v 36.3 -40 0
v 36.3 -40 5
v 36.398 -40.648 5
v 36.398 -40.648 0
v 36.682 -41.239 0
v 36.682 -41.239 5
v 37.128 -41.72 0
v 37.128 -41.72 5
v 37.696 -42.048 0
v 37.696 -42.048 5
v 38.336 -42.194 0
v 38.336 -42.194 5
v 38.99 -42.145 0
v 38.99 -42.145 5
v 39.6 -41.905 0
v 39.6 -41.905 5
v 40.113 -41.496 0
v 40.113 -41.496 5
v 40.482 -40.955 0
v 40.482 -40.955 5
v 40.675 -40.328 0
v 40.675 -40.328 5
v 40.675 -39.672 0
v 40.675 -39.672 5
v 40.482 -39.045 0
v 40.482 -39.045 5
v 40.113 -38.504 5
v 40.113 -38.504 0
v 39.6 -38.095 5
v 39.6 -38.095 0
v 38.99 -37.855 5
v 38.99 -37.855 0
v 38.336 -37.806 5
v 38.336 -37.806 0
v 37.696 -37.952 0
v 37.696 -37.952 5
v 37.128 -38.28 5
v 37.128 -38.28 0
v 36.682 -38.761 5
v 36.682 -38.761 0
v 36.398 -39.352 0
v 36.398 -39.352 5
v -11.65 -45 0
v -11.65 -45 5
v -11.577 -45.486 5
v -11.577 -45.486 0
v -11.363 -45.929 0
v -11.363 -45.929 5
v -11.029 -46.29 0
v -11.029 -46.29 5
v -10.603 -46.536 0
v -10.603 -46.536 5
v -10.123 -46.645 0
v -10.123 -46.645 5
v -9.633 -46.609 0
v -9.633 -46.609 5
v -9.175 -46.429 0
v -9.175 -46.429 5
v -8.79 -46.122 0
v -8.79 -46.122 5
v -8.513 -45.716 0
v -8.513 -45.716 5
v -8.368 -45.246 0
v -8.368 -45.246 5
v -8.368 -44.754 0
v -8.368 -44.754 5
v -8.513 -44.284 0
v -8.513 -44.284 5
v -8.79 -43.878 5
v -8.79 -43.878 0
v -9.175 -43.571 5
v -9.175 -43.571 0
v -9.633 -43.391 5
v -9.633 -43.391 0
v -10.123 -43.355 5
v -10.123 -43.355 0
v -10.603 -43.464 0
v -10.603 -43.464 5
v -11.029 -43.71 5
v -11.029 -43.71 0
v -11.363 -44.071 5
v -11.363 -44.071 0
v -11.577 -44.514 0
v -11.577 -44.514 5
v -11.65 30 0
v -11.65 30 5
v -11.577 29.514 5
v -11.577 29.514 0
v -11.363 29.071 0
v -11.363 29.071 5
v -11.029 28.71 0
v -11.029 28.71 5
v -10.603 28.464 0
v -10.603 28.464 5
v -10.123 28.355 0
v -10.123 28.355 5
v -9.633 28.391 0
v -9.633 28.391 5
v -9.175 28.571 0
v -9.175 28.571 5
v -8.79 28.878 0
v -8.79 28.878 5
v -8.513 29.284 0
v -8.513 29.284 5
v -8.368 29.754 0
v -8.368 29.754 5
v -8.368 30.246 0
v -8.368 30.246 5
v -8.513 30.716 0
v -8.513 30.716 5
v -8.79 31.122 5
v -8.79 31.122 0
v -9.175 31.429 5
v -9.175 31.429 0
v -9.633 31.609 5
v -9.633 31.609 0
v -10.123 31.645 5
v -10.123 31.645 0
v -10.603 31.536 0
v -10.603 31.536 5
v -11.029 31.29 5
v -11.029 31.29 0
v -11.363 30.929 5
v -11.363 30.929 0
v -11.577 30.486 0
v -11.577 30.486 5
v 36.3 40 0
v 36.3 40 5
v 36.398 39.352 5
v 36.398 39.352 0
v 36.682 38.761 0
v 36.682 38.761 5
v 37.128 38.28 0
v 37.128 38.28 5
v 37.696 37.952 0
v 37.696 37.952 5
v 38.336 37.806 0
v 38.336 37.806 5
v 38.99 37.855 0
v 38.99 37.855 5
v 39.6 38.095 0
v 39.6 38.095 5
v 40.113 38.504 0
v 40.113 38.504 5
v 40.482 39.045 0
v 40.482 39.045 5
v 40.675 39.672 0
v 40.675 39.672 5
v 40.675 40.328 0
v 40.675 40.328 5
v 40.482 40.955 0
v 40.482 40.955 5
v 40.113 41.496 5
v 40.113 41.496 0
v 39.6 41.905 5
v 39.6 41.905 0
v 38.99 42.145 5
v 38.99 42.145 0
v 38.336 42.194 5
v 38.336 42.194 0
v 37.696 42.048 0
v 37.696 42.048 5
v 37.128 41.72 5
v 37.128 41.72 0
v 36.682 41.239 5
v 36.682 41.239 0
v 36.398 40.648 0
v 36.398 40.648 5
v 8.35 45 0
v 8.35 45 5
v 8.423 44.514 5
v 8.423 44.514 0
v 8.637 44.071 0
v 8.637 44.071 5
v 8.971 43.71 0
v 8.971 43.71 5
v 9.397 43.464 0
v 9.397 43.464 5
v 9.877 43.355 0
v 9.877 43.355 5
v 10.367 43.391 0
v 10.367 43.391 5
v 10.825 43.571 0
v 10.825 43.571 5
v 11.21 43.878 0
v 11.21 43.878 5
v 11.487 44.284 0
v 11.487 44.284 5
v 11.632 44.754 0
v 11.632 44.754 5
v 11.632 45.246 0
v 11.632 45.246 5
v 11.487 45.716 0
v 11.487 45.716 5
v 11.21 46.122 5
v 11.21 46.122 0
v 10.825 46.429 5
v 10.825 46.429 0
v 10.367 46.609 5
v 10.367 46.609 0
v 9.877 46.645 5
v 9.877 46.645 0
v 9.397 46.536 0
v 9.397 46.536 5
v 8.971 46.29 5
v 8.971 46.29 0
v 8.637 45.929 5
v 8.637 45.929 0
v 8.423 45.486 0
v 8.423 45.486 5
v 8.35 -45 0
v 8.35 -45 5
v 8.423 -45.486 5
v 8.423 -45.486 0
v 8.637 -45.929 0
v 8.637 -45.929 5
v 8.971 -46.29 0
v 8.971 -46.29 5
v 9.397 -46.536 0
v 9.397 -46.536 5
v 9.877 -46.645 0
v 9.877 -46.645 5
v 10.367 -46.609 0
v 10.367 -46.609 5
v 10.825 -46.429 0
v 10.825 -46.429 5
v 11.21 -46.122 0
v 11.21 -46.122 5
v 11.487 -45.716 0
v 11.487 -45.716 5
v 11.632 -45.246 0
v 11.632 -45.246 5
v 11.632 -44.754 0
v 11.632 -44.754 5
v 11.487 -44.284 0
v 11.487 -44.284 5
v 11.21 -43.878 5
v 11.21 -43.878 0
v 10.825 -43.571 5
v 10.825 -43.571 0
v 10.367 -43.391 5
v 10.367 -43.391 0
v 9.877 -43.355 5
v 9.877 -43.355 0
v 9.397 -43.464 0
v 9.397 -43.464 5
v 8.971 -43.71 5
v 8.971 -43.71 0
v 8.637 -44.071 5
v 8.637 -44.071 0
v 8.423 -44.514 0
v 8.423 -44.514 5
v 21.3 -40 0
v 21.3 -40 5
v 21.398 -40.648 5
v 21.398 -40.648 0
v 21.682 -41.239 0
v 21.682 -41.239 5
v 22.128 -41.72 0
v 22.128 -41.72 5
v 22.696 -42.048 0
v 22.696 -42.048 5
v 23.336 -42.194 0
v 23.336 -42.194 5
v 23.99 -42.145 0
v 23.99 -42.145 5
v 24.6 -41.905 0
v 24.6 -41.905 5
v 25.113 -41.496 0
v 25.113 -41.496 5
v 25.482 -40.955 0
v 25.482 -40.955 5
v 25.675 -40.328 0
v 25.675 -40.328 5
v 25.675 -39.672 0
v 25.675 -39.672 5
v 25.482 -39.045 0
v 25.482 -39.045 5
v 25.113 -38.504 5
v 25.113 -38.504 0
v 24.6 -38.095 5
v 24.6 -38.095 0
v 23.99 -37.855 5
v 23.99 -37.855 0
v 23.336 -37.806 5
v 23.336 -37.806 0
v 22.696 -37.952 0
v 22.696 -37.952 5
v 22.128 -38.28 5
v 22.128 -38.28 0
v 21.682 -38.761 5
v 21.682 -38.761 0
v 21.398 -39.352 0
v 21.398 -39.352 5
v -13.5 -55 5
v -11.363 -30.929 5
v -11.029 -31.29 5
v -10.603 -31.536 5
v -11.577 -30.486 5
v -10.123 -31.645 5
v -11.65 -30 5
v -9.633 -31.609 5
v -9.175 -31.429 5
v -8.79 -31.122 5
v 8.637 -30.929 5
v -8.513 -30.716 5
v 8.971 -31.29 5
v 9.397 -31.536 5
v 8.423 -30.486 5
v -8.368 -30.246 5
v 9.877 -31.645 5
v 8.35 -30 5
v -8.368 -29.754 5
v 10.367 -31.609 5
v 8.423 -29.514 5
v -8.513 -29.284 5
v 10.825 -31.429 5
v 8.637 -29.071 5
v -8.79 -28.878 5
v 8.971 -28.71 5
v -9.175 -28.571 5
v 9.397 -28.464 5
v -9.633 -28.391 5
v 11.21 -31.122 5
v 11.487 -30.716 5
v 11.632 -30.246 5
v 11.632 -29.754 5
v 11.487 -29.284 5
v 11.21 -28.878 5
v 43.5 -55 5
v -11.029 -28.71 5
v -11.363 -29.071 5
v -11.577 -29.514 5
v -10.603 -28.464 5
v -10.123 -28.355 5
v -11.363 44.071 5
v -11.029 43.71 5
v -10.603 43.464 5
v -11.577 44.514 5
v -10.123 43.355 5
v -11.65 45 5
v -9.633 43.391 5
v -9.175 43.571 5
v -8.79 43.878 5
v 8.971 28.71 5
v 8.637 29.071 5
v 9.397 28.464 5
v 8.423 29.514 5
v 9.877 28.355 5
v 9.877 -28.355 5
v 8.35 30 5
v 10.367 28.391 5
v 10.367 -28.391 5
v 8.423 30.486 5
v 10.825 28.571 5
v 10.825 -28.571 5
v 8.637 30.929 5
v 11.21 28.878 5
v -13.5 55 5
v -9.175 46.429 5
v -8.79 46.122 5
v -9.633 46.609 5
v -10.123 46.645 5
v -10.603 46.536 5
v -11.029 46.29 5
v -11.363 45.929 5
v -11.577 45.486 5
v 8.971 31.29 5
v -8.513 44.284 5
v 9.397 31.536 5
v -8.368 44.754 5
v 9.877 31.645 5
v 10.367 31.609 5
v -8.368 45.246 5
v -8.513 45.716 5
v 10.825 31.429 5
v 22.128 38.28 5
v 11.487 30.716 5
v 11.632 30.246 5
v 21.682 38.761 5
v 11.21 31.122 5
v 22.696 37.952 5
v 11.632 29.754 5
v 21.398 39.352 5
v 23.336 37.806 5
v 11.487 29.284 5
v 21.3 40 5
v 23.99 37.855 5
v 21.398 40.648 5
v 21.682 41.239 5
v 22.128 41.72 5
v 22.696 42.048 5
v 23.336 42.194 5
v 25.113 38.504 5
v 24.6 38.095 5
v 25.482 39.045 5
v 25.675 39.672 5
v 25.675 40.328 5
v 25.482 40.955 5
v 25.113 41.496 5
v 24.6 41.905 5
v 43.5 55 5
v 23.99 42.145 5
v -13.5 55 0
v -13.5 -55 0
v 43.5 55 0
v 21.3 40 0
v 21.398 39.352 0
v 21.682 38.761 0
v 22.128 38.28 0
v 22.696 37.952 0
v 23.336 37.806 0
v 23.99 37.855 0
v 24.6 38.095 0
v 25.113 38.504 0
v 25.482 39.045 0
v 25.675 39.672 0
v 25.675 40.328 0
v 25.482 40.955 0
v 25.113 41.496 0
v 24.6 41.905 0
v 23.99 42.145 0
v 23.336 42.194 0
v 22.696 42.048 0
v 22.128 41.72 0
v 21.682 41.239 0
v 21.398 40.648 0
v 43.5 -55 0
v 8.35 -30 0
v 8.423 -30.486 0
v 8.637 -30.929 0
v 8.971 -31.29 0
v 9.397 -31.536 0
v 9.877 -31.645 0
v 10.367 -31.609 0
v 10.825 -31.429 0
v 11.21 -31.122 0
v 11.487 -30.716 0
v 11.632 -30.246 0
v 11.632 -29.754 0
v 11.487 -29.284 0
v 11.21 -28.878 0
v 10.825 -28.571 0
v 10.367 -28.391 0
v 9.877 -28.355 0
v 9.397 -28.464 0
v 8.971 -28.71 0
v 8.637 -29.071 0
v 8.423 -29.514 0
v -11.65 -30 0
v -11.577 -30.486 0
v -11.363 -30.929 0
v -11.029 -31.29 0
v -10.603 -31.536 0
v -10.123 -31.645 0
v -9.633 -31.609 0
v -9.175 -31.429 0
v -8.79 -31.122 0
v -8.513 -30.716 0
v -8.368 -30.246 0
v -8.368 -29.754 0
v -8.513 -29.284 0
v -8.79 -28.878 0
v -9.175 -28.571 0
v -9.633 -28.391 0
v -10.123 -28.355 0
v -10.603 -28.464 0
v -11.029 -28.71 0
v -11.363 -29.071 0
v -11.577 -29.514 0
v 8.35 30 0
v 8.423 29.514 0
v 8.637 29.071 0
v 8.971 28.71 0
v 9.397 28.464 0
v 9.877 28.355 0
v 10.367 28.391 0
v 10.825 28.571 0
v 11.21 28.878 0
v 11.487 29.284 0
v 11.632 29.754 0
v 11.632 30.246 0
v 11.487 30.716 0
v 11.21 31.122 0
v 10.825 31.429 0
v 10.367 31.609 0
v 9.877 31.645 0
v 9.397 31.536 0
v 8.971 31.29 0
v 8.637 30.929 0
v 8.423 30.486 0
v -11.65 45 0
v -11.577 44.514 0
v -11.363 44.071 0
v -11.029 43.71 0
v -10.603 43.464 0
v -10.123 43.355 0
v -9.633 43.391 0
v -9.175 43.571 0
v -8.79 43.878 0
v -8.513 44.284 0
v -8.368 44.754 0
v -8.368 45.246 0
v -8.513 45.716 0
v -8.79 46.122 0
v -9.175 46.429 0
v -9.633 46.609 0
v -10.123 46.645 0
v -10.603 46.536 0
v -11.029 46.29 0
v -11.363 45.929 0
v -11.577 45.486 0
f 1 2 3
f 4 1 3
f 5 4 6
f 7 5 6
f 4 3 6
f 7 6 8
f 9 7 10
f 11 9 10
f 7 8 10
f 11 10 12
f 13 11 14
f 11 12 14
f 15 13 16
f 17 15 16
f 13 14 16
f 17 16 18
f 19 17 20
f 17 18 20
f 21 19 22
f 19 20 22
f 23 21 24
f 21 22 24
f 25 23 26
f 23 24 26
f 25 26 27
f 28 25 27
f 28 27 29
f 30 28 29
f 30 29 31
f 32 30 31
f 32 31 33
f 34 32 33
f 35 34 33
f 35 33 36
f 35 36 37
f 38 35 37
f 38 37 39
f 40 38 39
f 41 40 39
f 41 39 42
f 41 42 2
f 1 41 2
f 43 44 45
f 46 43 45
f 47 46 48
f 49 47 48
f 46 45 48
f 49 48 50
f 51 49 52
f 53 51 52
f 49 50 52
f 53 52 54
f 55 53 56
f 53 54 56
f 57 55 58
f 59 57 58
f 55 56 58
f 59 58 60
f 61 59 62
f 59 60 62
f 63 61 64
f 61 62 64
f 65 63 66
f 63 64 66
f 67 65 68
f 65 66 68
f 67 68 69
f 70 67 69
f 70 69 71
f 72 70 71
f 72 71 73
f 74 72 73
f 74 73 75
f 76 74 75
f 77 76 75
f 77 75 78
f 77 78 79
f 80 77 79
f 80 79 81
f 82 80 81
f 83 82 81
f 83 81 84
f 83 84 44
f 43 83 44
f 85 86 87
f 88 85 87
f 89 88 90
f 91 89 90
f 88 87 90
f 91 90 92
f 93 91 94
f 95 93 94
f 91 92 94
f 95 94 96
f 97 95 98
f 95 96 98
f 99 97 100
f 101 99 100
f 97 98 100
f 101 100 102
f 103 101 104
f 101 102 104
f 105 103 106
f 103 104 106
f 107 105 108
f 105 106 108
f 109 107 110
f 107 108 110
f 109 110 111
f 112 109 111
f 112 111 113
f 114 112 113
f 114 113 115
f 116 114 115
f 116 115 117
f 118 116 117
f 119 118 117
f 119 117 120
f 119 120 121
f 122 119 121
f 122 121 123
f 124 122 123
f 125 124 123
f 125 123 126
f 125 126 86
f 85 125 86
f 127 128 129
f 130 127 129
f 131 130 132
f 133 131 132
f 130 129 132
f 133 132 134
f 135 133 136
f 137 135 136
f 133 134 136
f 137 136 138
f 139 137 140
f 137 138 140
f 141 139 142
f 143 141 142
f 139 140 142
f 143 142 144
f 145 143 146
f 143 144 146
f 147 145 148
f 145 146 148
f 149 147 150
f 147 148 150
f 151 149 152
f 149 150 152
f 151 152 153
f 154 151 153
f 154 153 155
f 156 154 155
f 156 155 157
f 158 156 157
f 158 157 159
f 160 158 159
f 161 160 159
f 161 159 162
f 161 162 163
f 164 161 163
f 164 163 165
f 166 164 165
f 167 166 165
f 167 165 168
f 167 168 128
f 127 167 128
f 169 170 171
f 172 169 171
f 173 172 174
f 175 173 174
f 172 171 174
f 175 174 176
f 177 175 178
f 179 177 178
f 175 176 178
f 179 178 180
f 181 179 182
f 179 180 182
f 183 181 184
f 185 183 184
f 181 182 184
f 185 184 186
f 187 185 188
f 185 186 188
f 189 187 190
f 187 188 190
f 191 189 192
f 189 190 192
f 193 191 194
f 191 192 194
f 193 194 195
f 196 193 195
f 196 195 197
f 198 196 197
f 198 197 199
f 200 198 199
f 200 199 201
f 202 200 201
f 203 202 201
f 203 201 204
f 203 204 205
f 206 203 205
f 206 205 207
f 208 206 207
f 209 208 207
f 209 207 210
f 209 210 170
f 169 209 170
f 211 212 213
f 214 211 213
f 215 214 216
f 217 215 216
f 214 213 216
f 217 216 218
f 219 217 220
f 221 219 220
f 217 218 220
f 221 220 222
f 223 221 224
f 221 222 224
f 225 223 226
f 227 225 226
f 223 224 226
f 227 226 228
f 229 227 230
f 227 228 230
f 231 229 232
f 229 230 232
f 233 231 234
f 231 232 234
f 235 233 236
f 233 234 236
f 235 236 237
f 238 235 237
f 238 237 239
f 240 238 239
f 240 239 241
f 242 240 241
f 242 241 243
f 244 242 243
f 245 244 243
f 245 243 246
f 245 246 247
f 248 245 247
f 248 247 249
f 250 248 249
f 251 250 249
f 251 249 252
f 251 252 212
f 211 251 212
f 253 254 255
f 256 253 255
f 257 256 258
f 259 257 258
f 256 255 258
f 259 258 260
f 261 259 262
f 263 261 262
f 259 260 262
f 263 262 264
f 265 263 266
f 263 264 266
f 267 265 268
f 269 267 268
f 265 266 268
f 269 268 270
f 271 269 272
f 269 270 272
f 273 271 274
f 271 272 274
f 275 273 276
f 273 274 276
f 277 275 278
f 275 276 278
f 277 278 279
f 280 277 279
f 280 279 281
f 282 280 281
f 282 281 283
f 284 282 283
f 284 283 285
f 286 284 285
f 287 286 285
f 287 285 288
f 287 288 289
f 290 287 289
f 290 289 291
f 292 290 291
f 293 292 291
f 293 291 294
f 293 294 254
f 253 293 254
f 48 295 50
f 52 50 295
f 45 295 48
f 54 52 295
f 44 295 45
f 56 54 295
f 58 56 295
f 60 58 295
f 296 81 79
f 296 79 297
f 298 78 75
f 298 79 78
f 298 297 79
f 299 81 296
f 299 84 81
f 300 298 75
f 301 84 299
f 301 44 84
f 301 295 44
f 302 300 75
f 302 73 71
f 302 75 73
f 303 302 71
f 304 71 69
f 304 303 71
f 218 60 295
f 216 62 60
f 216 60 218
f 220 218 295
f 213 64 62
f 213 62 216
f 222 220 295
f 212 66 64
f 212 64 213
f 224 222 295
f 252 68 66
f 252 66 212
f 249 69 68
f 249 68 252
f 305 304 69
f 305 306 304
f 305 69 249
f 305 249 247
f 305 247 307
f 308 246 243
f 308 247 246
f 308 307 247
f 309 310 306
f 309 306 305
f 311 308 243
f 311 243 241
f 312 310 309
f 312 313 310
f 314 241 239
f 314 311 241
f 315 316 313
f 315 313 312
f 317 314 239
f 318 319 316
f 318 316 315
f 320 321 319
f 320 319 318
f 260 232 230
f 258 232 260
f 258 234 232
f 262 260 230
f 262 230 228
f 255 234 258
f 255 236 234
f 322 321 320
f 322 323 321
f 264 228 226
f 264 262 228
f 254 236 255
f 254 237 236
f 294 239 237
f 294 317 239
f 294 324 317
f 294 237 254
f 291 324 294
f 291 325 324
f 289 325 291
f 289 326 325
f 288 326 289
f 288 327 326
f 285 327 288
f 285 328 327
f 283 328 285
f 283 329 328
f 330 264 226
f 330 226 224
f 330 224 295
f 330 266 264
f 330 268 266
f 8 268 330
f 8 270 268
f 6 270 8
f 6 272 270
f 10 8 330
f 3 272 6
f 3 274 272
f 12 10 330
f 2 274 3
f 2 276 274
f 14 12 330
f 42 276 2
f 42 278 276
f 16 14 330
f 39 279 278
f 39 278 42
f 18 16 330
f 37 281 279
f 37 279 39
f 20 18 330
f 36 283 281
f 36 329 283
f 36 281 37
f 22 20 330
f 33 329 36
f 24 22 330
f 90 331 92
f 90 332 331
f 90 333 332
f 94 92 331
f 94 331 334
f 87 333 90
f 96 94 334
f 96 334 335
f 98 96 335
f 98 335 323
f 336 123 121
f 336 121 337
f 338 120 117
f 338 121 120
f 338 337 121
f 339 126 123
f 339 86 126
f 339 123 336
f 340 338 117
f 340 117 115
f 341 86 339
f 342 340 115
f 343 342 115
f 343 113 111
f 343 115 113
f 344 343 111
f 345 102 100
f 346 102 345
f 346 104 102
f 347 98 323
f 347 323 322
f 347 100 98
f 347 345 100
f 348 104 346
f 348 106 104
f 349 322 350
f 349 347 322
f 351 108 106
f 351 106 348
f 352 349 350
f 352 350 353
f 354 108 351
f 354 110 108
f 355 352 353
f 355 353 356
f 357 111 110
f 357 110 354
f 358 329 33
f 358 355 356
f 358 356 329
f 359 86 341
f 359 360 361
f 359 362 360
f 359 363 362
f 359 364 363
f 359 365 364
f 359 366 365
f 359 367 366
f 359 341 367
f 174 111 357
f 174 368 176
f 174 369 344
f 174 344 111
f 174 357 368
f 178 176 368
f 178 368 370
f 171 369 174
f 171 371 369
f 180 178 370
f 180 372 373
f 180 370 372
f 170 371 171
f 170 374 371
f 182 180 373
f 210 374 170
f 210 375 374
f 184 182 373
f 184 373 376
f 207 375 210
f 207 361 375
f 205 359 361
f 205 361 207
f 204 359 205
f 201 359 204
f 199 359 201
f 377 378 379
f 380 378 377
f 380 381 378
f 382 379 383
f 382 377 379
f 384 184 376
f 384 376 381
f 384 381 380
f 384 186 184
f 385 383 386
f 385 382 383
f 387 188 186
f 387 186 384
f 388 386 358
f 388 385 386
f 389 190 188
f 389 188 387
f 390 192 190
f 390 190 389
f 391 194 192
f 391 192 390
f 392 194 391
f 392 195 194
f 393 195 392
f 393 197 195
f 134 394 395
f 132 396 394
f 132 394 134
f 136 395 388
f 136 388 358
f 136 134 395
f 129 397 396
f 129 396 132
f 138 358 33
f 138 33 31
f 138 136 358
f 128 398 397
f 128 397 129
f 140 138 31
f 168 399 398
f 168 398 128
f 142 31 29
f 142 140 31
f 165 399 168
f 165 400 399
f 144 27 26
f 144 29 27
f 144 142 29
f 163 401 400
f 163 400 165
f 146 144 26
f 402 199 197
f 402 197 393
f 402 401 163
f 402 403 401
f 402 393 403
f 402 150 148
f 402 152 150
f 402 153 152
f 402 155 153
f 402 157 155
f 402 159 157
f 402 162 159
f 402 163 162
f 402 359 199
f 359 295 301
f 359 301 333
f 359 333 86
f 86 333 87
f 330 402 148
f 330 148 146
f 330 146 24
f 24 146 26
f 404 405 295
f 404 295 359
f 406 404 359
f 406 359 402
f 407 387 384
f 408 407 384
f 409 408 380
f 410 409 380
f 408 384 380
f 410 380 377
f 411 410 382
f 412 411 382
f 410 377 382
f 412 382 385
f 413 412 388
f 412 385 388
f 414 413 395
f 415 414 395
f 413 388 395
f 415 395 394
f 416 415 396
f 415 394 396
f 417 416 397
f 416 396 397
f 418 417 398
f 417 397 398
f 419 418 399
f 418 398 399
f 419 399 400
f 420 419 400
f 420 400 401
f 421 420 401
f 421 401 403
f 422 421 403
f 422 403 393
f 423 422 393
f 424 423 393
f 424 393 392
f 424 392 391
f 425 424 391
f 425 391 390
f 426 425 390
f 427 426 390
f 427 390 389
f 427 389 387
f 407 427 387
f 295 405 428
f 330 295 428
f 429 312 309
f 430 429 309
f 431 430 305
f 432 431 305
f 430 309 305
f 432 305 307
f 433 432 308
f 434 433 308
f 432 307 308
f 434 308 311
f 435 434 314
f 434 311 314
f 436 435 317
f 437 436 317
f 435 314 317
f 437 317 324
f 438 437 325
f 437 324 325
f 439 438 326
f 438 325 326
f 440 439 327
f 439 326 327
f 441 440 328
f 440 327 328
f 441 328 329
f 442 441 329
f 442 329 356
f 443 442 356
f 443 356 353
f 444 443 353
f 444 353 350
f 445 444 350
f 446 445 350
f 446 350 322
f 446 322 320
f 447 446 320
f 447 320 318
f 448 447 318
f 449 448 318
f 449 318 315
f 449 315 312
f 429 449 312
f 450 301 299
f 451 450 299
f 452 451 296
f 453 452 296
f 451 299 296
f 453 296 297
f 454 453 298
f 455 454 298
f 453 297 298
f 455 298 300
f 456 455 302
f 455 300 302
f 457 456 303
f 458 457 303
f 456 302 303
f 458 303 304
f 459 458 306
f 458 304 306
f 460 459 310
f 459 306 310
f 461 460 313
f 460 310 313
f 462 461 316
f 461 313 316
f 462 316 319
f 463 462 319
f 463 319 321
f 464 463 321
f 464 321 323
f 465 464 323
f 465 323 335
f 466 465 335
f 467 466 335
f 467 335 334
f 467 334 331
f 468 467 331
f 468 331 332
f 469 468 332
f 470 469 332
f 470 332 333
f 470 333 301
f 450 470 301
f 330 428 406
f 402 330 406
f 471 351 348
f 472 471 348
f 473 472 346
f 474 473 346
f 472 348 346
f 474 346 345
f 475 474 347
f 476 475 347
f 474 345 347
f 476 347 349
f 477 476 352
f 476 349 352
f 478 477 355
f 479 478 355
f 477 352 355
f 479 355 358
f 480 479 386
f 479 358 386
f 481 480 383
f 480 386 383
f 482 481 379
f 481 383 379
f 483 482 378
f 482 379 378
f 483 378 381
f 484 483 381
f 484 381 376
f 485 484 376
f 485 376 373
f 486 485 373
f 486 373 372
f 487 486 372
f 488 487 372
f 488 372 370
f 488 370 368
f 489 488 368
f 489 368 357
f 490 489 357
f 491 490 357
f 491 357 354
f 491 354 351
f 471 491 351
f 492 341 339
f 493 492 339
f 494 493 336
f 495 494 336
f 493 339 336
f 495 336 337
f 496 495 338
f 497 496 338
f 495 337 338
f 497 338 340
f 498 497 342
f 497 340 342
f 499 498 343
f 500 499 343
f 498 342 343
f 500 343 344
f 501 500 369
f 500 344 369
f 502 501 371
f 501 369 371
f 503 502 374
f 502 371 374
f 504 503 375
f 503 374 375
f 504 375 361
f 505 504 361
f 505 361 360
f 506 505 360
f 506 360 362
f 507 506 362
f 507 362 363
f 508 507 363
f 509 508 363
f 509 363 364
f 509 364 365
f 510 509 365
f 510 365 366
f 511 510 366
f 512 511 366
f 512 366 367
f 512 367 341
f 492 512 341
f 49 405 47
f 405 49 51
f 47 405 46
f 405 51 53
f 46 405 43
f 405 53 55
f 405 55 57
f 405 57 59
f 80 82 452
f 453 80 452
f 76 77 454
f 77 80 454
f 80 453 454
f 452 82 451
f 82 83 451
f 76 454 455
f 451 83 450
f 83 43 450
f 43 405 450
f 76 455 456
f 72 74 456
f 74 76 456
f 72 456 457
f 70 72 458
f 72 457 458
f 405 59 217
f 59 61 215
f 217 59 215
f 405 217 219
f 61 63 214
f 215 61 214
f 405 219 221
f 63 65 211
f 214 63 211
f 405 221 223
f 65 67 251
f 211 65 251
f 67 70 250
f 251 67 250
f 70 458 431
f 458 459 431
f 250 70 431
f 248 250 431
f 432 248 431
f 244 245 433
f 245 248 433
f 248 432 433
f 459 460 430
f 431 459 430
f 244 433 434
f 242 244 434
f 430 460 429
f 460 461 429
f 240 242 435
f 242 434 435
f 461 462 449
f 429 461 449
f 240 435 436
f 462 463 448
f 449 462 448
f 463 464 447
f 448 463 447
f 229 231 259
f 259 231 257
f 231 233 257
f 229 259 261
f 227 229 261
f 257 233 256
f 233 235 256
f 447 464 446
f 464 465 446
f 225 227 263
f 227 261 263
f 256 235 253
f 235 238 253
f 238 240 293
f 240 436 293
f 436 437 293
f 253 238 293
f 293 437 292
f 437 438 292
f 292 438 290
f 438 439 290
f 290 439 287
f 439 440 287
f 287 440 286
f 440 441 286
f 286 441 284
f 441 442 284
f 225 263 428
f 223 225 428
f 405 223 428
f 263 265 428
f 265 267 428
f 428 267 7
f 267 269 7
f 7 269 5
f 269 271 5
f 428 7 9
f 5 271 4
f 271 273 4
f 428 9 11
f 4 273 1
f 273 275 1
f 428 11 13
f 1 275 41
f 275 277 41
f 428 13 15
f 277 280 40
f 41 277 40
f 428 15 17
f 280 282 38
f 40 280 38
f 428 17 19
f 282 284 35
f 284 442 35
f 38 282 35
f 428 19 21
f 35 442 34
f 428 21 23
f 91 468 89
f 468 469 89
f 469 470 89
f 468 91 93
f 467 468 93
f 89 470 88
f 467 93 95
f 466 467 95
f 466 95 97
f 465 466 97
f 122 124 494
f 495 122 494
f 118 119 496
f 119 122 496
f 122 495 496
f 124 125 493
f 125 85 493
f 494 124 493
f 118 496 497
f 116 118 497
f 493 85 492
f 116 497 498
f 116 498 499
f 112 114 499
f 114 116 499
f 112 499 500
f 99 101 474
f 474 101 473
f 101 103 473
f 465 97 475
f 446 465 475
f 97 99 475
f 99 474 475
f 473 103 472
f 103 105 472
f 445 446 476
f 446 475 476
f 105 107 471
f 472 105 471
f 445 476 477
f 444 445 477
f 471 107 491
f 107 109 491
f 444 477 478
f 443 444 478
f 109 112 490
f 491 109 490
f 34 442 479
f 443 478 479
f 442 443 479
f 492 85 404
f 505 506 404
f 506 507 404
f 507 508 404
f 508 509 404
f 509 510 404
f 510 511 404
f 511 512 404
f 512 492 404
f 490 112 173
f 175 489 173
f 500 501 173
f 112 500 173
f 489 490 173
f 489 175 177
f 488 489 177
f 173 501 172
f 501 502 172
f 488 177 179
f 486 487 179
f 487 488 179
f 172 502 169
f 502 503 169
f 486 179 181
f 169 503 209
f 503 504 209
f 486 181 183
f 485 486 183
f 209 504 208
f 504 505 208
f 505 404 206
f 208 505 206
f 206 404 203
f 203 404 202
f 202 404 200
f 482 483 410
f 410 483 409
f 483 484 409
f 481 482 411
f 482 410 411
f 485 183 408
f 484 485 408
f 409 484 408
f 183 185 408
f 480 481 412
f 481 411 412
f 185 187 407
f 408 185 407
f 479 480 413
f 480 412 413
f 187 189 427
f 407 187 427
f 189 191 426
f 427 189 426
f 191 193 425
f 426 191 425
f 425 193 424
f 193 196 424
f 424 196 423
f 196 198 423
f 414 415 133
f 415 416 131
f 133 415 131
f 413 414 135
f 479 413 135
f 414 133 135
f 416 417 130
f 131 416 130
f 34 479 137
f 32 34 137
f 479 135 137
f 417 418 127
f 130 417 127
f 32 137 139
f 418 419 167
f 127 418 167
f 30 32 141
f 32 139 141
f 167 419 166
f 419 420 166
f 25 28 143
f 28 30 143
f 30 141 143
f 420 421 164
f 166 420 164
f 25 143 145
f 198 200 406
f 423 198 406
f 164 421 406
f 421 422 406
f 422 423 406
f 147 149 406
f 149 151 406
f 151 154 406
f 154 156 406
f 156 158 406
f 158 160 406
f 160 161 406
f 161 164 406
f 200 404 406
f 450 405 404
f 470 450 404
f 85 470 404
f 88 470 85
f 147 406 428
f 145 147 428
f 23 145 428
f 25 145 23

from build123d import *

# Parameters (mm, degrees)
F0_W     = 57
F0_H     = 110
F1_DEPTH = 5
F2_D     = 3.3
F3_D     = 4.4


with BuildPart() as f1:
    # F0 (on Top) → F1 (new body)
    with BuildSketch(Plane.XY):
        with Locations((15, 0)):
            Rectangle(F0_W, F0_H)
    extrude(amount=F1_DEPTH)

    # F2 (through all)
    with Locations(Plane(origin=(0, 0, 0), x_dir=(1, 0, 0), z_dir=(0, 0, -1))):
        with Locations((-10, -45), (-10, -30), (10, -30), (10, -45), (-10, 30), (-10, 45), (10, 45), (10, 30)):
            Hole(F2_D / 2)

    # F3 (through all)
    with Locations(Plane(origin=(0, 0, 0), x_dir=(1, 0, 0), z_dir=(0, 0, -1))):
        with Locations((23.5, -40), (38.5, -40), (23.5, 40), (38.5, 40)):
            Hole(F3_D / 2)


solid = f1.part
